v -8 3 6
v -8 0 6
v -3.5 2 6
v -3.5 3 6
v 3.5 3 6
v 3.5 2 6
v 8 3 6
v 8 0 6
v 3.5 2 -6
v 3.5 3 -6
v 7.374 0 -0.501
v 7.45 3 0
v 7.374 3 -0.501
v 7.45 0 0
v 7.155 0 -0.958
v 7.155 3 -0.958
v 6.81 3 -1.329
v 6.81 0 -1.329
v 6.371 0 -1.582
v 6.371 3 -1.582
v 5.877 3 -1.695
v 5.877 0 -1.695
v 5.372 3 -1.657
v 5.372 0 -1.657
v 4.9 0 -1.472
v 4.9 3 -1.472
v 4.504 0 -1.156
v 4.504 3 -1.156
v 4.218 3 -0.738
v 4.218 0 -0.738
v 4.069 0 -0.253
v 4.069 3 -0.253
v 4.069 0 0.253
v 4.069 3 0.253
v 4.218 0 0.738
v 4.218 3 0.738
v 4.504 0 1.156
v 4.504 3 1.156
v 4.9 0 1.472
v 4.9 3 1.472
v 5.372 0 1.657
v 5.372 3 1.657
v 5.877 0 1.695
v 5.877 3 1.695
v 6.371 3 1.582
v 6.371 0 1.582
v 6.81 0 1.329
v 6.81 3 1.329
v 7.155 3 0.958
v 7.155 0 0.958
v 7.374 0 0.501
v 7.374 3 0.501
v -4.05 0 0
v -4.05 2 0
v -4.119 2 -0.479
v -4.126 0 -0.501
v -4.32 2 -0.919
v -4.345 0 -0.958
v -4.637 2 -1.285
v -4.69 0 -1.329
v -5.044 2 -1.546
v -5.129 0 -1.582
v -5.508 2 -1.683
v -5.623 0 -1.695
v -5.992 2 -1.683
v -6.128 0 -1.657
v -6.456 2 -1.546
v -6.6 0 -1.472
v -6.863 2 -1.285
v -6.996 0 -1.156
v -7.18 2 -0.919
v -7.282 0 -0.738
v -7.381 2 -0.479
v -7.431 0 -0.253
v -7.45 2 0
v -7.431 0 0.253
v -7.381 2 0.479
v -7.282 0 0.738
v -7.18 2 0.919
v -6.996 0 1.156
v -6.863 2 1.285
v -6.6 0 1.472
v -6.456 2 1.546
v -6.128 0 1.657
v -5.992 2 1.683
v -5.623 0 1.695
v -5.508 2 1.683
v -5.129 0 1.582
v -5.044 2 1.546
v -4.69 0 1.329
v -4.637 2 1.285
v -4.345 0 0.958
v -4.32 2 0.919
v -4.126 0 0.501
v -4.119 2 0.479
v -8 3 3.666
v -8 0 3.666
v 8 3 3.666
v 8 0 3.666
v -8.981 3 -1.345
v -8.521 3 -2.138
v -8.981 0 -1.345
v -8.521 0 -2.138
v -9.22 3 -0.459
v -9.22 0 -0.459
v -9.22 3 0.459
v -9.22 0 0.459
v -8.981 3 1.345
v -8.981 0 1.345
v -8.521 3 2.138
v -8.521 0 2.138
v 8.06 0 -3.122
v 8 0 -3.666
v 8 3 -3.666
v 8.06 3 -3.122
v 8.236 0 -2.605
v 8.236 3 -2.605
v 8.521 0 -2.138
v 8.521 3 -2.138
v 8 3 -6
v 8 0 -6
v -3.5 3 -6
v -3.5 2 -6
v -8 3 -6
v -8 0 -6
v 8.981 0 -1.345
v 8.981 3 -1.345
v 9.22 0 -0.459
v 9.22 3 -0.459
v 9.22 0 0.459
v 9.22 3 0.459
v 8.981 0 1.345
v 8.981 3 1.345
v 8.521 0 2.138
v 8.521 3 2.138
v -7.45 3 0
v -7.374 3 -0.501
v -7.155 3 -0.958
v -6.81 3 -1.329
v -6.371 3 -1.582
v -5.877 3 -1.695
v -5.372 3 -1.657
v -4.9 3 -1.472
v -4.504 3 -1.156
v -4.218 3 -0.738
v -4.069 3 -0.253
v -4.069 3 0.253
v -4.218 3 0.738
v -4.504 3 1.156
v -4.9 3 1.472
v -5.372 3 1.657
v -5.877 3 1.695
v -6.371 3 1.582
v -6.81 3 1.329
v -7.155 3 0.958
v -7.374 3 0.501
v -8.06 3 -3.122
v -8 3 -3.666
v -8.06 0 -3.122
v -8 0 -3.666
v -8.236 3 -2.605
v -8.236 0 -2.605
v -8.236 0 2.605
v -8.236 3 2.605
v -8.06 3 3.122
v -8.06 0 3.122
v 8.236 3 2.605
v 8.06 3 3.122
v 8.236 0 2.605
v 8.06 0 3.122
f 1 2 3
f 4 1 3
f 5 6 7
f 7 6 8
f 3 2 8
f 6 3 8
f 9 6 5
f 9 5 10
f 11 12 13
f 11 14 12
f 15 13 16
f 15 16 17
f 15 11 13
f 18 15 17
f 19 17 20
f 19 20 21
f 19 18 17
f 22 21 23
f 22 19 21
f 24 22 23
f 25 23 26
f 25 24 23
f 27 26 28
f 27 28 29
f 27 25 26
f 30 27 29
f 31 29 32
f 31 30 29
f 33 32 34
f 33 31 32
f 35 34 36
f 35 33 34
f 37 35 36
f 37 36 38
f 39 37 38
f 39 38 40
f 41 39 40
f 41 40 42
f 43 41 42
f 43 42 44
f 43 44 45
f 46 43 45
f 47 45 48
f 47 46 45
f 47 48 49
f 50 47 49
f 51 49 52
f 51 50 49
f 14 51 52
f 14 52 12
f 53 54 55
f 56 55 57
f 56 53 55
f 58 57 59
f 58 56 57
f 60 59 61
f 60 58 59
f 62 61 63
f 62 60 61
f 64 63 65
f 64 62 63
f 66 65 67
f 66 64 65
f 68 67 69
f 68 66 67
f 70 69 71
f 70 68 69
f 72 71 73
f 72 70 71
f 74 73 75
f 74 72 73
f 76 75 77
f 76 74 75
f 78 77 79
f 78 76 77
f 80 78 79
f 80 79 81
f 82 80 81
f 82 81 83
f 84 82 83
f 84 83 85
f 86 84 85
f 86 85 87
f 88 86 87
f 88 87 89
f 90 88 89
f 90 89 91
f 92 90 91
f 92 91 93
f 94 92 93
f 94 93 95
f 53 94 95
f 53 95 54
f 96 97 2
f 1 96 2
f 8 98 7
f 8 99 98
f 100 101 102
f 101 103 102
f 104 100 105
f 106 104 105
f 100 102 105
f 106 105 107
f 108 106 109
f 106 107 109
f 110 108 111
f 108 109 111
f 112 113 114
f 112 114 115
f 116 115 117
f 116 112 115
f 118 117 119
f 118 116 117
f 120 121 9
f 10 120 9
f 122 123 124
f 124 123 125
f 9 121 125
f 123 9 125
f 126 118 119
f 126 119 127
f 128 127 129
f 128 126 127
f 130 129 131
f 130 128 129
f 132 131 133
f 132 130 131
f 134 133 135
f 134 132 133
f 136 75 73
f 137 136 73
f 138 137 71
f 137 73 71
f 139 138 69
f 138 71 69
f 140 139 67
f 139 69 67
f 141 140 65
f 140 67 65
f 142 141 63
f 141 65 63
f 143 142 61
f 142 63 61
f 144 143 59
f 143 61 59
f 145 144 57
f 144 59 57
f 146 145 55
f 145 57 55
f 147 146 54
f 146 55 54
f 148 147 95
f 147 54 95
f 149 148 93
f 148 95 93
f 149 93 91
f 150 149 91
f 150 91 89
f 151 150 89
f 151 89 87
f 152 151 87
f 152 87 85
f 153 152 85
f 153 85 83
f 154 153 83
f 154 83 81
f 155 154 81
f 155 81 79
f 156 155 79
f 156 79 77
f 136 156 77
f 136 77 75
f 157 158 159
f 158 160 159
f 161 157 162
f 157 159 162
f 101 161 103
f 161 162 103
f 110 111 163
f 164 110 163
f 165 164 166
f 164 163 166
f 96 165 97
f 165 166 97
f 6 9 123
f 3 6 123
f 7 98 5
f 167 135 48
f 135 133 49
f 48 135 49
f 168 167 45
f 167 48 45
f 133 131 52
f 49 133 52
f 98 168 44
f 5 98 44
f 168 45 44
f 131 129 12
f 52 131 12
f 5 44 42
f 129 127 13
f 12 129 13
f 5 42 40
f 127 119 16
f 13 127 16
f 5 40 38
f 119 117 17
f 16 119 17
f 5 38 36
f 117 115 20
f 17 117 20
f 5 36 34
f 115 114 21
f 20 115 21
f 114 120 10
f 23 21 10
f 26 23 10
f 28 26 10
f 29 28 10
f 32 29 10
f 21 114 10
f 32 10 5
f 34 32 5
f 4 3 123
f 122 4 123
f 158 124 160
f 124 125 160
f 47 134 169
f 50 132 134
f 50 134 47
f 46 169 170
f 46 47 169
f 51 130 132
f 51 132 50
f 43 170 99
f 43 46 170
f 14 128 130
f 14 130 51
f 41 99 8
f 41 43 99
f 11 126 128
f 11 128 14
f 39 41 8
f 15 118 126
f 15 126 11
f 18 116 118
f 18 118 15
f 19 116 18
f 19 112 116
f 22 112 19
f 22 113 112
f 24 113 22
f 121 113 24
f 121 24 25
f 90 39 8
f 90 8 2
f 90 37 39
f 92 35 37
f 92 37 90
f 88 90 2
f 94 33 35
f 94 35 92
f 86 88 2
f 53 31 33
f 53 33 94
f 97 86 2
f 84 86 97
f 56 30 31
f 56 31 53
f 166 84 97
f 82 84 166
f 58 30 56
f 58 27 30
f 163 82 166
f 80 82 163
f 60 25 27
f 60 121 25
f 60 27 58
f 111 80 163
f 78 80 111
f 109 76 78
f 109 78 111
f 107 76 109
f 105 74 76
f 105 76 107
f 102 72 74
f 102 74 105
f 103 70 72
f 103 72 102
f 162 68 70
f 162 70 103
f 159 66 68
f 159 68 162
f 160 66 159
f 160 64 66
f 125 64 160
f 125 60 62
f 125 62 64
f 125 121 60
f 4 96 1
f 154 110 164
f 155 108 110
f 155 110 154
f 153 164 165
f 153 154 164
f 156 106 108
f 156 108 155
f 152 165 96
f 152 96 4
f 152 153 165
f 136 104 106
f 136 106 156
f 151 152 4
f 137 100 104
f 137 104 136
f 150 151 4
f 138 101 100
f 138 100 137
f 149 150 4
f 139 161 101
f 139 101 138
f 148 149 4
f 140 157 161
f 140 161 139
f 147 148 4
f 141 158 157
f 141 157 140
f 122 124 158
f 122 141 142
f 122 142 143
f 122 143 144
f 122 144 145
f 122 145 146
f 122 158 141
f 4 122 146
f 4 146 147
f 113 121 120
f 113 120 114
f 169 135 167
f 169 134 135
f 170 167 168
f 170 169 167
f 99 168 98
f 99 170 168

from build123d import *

# Parameters (mm, degrees)
CROQUIS1_R              = 1.7
SALIENTE_EXTRUIR1_DEPTH = 2
CROQUIS5_R              = 1.7
SALIENTE_EXTRUIR3_DEPTH = 1


with BuildPart() as part:
    # Croquis1 → Saliente-Extruir1 (new body)
    with BuildSketch(Plane(origin=(0, 0, 0), x_dir=(1, 0, 0), z_dir=(0, 1, 0))):
        with BuildLine():
            Line((-8, 6), (8, 6))
            Line((8, 6), (8, 3.665719575))
            ThreePointArc((8, 3.665719575), (8.133788189, 2.858848044), (8.520833333, 2.138336419))
            ThreePointArc((8.520833333, 2.138336419), (9.25, 0), (8.520833333, -2.138336419))
            ThreePointArc((8.520833333, -2.138336419), (8.133788189, -2.858848044), (8, -3.665719575))
            Line((8, -3.665719575), (8, -6))
            Line((8, -6), (-8, -6))
            Line((-8, -6), (-8, -3.665719575))
            ThreePointArc((-8, -3.665719575), (-8.133788189, -2.858848044), (-8.520833333, -2.138336419))
            ThreePointArc((-8.520833333, -2.138336419), (-9.25, 0), (-8.520833333, 2.138336419))
            ThreePointArc((-8.520833333, 2.138336419), (-8.133788189, 2.858848044), (-8, 3.665719575))
            Line((-8, 3.665719575), (-8, 6))
        make_face()
        with Locations((5.75, 0)):
            Circle(CROQUIS1_R, mode=Mode.SUBTRACT)
        with Locations((-5.75, 0)):
            Circle(CROQUIS1_R, mode=Mode.SUBTRACT)
    extrude(amount=SALIENTE_EXTRUIR1_DEPTH)

    # Croquis5 → Saliente-Extruir3 (add)
    with BuildSketch(Plane(origin=(0, 2, 0), x_dir=(1, 0, 0), z_dir=(0, 1, 0))):
        with BuildLine():
            Line((3.5, -6), (3.5, 6))
            Line((3.5, 6), (8, 6))
            Line((8, 6), (8, 3.665719575))
            ThreePointArc((8, 3.665719575), (8.133788189, 2.858848044), (8.520833333, 2.138336419))
            ThreePointArc((8.520833333, 2.138336419), (9.25, 0), (8.520833333, -2.138336419))
            ThreePointArc((8.520833333, -2.138336419), (8.133788189, -2.858848044), (8, -3.665719575))
            Line((8, -3.665719575), (8, -6))
            Line((8, -6), (3.5, -6))
        make_face()
        with Locations((5.75, 0)):
            Circle(CROQUIS5_R, mode=Mode.SUBTRACT)
    saliente_extruir3 = extrude(amount=SALIENTE_EXTRUIR3_DEPTH)

    # Simetría1: Saliente-Extruir3 across plane
    add(saliente_extruir3.mirror(Plane(origin=(0, 0, 0), x_dir=(0, 0, 1), z_dir=(1, 0, 0))))


solid = part.part
